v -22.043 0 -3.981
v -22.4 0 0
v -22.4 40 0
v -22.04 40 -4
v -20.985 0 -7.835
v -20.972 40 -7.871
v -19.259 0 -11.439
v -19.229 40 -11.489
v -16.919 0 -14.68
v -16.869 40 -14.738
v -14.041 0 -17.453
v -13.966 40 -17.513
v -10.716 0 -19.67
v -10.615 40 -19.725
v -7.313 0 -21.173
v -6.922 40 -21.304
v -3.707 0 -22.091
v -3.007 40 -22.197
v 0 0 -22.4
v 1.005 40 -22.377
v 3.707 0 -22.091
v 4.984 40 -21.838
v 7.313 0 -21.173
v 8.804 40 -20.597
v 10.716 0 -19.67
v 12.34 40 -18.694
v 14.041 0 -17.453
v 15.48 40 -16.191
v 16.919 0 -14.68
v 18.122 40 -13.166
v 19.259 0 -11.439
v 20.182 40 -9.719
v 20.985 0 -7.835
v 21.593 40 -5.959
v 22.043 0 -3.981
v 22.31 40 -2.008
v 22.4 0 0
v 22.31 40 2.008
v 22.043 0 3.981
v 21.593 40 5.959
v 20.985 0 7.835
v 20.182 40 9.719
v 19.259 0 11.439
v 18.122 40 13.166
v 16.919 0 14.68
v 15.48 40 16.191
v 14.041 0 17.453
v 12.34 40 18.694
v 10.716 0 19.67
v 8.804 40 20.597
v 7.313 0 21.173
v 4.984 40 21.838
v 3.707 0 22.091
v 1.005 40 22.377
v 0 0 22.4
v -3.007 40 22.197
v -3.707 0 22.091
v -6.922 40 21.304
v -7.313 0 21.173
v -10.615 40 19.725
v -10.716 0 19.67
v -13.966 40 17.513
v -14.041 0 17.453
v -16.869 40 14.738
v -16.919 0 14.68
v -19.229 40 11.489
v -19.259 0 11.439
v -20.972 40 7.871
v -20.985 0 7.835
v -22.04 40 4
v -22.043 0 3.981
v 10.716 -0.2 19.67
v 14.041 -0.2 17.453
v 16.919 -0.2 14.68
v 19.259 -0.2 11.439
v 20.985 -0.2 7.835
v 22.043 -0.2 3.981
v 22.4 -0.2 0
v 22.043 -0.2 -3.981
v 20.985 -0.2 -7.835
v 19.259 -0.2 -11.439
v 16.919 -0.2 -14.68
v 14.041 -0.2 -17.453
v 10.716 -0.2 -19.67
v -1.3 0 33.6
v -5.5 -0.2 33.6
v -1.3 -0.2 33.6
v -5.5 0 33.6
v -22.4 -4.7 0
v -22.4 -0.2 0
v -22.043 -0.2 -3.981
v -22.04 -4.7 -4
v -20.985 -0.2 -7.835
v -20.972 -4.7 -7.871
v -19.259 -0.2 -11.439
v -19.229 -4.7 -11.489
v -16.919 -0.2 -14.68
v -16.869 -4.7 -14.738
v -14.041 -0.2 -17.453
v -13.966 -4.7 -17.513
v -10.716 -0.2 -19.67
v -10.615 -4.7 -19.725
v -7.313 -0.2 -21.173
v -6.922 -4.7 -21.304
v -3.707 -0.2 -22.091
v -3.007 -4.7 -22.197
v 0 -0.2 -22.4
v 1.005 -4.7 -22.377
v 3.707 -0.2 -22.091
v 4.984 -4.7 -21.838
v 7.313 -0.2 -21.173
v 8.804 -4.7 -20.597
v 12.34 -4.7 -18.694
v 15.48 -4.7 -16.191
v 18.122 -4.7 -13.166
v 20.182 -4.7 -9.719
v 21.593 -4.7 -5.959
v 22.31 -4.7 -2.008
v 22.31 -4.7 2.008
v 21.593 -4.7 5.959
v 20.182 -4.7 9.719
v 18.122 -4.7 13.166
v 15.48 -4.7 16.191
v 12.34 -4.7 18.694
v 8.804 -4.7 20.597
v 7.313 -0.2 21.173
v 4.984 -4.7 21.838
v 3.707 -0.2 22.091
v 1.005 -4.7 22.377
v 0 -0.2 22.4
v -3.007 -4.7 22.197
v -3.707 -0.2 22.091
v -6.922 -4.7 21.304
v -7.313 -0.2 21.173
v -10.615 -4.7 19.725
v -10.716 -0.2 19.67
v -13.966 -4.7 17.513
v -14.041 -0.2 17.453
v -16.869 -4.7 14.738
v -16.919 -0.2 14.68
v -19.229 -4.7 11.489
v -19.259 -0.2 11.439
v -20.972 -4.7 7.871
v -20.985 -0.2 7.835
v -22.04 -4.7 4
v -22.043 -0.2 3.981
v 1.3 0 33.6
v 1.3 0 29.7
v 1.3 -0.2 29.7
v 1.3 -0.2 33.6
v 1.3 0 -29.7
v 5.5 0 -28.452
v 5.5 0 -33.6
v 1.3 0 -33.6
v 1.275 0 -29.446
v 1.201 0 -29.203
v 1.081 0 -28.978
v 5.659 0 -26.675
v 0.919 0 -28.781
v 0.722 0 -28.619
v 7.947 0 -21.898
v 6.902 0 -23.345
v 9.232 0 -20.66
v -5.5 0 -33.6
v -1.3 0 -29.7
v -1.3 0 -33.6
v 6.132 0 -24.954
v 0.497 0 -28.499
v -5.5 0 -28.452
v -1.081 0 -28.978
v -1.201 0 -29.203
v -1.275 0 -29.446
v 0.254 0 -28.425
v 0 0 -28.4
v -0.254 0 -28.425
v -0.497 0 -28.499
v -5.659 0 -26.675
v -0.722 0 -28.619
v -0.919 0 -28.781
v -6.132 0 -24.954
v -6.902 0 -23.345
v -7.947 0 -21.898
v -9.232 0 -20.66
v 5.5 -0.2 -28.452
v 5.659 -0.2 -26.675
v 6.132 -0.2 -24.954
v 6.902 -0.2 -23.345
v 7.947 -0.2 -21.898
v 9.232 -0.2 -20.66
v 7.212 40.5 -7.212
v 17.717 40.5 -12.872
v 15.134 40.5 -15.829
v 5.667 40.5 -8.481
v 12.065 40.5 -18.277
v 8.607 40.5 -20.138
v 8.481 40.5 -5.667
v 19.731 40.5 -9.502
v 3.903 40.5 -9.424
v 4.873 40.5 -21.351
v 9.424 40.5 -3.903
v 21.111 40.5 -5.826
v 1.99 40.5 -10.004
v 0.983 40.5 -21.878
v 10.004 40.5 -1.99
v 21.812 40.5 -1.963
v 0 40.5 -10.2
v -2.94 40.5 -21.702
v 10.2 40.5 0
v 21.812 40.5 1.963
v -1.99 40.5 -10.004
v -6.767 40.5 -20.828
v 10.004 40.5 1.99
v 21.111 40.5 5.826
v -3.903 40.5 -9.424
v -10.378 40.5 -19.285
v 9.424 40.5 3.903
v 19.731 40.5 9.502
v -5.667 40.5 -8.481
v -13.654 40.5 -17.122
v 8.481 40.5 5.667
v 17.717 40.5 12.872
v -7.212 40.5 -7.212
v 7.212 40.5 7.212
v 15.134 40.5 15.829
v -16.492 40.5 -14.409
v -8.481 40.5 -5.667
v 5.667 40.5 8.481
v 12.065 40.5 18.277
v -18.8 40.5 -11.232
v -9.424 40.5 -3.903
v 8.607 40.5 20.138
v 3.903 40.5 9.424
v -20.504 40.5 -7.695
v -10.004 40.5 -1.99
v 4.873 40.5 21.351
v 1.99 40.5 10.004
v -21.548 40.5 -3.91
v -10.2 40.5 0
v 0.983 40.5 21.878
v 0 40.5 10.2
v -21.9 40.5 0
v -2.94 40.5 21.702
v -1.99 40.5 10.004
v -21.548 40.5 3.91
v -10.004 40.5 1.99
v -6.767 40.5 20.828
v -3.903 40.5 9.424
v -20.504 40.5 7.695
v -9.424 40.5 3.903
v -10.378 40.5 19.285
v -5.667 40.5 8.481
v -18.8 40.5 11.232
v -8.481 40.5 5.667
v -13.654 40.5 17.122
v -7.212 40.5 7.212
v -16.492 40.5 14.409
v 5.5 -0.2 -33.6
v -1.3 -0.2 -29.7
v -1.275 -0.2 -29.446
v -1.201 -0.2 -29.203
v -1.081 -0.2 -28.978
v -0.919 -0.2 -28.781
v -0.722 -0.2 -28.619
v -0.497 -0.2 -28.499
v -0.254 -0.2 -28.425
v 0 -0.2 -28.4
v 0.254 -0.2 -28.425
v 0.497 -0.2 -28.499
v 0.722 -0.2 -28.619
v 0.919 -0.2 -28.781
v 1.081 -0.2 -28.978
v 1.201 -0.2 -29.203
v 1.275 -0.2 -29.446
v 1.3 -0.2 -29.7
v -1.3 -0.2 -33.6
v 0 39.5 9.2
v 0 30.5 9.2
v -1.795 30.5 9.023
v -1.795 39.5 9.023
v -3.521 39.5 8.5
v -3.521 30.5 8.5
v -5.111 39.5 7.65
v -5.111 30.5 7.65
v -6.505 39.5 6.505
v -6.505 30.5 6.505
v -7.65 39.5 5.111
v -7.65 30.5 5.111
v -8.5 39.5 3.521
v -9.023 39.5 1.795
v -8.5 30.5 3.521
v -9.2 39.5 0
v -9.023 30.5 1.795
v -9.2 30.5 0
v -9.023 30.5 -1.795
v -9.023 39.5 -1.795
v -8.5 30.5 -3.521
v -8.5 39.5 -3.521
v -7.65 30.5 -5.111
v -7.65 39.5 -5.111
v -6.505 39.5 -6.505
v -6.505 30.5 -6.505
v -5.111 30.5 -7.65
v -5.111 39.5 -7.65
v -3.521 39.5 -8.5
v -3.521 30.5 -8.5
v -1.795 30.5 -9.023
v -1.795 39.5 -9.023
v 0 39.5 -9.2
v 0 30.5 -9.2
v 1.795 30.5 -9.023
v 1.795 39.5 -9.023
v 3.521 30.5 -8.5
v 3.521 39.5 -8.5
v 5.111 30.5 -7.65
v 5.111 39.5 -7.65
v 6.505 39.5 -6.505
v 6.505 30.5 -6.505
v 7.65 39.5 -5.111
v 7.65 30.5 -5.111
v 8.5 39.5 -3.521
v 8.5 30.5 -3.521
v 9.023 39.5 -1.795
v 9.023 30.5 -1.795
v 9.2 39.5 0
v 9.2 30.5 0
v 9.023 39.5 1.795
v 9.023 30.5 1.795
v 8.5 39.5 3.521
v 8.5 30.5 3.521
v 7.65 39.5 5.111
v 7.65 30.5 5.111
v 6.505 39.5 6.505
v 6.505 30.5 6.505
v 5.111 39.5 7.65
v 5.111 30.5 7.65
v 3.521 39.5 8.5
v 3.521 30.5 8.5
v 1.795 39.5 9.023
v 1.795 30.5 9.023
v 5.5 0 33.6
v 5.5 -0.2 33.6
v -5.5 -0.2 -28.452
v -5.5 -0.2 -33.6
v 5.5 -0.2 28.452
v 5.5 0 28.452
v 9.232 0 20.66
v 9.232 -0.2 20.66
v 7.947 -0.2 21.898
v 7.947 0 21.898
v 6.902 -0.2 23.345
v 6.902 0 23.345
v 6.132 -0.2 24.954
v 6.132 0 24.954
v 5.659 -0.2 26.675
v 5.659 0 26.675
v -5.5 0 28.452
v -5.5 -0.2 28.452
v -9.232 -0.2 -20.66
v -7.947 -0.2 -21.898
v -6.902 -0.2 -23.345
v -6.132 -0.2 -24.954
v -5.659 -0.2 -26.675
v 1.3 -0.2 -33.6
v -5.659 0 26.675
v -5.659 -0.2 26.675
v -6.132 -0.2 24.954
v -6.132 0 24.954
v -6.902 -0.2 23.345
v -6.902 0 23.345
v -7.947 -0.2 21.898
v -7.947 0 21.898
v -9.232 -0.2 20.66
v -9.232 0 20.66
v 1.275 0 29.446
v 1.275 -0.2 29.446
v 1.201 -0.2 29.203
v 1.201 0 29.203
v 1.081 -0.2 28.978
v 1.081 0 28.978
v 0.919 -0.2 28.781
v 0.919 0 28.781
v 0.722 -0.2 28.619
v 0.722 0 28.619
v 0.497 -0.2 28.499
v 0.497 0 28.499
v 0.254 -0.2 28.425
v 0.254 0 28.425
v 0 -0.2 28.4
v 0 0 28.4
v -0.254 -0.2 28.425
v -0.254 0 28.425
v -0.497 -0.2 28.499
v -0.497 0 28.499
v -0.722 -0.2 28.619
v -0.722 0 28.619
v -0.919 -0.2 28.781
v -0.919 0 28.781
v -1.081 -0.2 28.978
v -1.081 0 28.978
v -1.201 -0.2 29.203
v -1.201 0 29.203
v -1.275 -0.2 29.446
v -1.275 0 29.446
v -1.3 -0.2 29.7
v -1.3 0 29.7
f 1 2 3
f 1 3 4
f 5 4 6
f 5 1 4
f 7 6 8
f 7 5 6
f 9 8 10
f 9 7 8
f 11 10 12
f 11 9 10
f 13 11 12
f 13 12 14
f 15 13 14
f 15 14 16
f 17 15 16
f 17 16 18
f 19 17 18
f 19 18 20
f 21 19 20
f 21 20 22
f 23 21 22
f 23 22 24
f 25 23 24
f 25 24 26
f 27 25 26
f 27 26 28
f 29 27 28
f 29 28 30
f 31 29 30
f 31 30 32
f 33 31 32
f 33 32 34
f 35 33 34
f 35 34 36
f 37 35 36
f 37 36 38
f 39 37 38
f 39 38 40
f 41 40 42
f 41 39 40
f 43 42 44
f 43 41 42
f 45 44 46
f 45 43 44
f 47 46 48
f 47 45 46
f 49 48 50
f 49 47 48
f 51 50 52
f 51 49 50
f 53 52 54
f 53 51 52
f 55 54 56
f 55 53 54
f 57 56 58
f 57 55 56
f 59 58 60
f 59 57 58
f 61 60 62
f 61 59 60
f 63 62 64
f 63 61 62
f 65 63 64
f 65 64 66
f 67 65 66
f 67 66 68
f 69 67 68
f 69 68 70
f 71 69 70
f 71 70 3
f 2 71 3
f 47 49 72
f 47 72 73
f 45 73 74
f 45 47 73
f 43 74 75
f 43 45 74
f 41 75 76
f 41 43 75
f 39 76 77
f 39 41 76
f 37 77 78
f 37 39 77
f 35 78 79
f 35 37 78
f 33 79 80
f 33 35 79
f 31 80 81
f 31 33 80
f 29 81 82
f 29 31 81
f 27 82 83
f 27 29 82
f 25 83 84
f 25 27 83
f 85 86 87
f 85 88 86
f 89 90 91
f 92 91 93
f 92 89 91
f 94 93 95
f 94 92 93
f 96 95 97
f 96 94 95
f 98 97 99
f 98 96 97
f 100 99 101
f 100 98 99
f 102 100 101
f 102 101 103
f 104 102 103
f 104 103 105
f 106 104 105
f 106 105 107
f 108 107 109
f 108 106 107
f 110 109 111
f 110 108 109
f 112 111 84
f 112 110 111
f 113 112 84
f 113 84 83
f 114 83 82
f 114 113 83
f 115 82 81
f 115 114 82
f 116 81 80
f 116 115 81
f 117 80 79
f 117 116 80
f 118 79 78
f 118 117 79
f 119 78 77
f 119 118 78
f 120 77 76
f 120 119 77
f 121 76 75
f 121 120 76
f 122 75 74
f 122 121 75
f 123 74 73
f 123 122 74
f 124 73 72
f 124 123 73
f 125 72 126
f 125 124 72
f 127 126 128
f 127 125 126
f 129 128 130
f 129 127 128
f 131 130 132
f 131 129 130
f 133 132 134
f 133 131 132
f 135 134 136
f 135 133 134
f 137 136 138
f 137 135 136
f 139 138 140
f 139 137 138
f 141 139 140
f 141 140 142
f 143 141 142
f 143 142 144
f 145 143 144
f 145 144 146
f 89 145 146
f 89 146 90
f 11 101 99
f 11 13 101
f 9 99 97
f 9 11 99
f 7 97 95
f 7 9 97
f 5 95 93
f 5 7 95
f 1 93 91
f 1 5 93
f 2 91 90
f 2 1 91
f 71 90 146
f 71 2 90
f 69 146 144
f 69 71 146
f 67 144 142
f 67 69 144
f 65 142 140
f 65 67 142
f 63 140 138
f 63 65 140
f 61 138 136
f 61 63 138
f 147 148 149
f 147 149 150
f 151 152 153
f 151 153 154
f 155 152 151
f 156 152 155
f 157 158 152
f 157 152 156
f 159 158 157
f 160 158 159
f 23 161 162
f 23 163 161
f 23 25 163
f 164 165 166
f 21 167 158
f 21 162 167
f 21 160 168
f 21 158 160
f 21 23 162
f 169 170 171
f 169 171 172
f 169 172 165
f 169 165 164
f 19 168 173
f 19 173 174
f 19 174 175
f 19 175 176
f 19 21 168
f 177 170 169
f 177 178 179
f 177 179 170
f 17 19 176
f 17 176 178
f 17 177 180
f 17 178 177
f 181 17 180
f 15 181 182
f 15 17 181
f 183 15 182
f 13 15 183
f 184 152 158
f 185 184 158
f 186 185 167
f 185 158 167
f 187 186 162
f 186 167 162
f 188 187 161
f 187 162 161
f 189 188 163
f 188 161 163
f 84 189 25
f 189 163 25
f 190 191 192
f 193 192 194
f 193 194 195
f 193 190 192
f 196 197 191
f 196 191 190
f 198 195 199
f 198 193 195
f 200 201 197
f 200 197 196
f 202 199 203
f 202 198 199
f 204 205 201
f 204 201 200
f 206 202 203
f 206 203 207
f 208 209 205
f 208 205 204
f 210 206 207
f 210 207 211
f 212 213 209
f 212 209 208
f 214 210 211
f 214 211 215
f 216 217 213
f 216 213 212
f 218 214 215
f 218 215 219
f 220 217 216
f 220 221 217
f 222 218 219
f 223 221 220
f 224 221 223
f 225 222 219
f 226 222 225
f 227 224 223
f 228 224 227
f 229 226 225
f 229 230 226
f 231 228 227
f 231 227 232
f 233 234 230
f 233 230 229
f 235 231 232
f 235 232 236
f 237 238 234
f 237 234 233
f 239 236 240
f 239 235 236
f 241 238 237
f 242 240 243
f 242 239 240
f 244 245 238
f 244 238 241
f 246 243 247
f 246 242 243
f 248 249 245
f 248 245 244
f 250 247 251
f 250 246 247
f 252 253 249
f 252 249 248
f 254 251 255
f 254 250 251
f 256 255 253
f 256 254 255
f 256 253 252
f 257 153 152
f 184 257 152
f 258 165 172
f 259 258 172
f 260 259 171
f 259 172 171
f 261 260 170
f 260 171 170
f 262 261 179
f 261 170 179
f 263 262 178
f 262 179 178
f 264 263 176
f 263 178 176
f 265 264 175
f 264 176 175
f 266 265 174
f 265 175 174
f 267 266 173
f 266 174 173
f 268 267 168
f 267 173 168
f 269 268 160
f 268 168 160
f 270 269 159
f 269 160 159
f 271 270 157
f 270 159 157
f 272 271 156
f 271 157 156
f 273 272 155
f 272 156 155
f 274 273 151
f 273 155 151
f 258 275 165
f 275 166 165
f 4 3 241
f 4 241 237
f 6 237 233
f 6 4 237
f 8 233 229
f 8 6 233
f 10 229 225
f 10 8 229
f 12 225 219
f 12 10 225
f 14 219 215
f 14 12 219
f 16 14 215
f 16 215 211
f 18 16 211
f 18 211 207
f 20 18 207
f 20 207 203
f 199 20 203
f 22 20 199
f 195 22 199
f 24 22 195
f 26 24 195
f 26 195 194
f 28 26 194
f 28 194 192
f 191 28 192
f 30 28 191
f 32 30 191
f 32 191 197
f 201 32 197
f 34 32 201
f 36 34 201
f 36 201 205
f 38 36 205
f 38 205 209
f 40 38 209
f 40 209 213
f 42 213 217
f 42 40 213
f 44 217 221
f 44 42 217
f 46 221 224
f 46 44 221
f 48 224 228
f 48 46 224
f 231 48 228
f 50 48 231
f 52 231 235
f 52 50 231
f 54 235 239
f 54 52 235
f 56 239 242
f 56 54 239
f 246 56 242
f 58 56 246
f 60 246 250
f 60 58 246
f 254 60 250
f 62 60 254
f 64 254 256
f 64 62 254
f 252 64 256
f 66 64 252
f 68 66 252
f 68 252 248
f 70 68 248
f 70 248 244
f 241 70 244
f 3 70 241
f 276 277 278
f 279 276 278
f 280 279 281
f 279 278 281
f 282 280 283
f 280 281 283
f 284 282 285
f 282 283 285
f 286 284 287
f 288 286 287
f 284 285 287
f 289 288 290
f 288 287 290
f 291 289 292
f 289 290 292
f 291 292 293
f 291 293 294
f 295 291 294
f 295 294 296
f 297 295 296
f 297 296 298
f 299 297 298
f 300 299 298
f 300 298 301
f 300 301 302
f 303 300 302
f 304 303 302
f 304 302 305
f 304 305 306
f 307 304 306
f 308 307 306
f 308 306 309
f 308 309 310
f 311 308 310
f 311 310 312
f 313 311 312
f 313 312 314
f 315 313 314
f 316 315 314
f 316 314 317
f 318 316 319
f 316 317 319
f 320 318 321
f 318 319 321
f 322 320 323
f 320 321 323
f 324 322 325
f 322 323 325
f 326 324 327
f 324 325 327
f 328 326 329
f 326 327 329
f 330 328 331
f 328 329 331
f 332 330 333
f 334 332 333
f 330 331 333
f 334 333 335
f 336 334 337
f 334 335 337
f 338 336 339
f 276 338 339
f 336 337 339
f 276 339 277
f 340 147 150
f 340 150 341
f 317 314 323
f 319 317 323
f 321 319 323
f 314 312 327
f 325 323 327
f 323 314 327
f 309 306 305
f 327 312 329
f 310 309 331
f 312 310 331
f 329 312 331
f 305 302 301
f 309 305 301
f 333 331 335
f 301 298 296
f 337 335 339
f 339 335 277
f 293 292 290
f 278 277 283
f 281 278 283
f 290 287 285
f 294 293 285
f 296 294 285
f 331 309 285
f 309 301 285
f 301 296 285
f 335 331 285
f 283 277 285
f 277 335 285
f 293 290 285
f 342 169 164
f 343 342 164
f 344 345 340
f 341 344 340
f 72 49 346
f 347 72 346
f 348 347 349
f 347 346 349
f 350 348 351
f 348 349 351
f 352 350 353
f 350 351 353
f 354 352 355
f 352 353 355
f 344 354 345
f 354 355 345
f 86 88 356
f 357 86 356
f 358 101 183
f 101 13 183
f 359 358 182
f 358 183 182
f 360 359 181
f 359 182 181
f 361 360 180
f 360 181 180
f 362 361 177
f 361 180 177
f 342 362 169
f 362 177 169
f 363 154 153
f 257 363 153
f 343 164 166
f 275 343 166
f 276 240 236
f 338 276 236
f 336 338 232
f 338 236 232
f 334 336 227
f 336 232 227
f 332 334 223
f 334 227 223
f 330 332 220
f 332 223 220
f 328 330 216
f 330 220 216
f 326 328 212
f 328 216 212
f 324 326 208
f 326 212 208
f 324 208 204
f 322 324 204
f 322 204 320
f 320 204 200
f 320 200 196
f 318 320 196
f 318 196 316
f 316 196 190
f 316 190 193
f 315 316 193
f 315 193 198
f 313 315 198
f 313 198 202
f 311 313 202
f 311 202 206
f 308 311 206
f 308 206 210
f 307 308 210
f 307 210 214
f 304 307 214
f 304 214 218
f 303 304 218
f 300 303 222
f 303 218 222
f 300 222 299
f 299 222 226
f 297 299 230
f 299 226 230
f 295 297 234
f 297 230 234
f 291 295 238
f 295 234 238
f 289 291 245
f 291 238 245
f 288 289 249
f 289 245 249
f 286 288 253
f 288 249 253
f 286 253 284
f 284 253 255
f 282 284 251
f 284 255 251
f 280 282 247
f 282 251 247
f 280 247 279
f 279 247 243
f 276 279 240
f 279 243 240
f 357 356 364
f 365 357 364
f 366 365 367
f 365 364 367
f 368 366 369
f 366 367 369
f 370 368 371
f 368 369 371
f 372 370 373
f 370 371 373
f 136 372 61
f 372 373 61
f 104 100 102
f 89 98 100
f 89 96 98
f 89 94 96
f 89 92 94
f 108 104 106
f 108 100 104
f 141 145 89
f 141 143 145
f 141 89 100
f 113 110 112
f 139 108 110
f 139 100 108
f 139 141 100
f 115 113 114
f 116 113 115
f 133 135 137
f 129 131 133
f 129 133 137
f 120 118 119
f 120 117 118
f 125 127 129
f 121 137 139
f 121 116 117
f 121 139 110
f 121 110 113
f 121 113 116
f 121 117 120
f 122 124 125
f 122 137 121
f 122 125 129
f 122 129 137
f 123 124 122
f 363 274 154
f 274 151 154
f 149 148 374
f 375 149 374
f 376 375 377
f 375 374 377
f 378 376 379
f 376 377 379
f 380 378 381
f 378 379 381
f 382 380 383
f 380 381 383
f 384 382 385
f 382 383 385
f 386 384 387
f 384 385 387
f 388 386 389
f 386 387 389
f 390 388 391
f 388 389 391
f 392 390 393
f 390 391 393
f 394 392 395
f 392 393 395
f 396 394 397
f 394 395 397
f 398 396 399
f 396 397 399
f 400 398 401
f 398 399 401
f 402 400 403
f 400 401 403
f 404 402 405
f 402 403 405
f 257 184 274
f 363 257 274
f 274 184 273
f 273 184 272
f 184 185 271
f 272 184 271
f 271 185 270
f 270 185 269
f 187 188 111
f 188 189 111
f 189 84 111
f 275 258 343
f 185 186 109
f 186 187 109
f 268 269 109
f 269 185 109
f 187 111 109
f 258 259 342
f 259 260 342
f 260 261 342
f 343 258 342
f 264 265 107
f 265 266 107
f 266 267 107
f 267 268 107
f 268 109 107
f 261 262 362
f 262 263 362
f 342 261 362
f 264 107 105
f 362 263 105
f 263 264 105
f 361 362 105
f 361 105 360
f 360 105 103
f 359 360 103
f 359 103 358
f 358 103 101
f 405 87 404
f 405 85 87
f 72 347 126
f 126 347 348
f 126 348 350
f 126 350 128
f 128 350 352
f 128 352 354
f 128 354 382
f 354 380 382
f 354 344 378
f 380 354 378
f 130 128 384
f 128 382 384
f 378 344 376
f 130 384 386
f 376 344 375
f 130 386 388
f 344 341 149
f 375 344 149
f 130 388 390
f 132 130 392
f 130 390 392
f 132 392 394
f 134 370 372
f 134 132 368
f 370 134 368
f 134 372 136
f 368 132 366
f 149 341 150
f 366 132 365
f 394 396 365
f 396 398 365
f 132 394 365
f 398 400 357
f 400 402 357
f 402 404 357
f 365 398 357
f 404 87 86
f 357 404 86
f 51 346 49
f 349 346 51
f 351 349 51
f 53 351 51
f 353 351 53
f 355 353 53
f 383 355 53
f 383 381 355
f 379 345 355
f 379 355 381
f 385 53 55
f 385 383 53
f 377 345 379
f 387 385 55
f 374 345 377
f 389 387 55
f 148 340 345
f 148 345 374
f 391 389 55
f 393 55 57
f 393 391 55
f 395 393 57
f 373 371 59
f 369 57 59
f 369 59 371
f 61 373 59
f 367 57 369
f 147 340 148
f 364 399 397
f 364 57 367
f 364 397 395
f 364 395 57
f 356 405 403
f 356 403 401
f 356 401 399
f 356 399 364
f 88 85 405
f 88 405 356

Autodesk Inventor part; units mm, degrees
sketch "Sketch1" plane through (0, 0, 0) normal (0, 1, 0) x (-1, 0, 0)
  circle A0 centre (0, 0) radius 22.4
  dimension "d0" = 44.8
ref_plane "Work Plane1" through (0, 40.5, 0) normal (0, 1, 0) x (-1, 0, 0)
sketch "Sketch2" plane through (0, 40.5, 0) normal (0, 1, 0) x (-1, 0, 0)
  circle A0 centre (0, 0) radius 22.4 projected
ref_plane "Work Plane3" through (0, -53, 0) normal (0, 1, 0) x (-1, 0, 0)
ref_plane "Work Plane2" through (0, -41, 0) normal (0, 1, 0) x (-1, 0, 0)
sketch "Sketch3" plane through (0, -41, 0) normal (0, 1, 0) x (-1, 0, 0)
  circle A0 centre (0, 0) radius 33.8
  dimension "d4" = 67.6
sketch "Sketch4" plane through (0, -53, 0) normal (0, 1, 0) x (-1, 0, 0)
  circle A0 centre (0, 0) radius 33.8 projected
loft "Loft1" add profiles "Sketch2", "Sketch1"
loft "Loft3" [suppressed]
sketch "Sketch5" plane through (0, 0, 0) normal (0, 1, 0) x (-1, 0, 0)
  line L0 (-5.5, 33.6) -> (5.5, -33.6) construction
  line L1 (3.6185, 22.1058) -> (-5.5, -33.6) construction
  line L2 (5.5, 33.6) -> (5.5, 28.4519)
  line L3 (5.5, -28.4519) -> (5.5, -33.6)
  line L4 (-5.5, -33.6) -> (-5.5, -28.4519)
  line L5 (-5.5, 28.4519) -> (-5.5, 33.6)
  arc A0 (-10.716, 19.6704) -> (-10.716, -19.6704) centre (0, 0) ccw
  arc A1 (10.716, -19.6704) -> (10.716, 19.6704) centre (0, 0) ccw
  arc A2 (5.5, 28.4519) -> (10.716, 19.6704) centre (15.5, 28.4519) ccw
  arc A3 (-10.716, 19.6704) -> (-5.5, 28.4519) centre (-15.5, 28.4519) ccw
  arc A4 (10.716, -19.6704) -> (5.5, -28.4519) centre (15.5, -28.4519) ccw
  arc A5 (-5.5, -28.4519) -> (-10.716, -19.6704) centre (-15.5, -28.4519) ccw
  circle A6 centre (0, 0) radius 22.4 construction
  line L6 (0, -22.4) -> (0, -33.6) construction
  line L7 (1.3, -33.6) -> (1.3, -29.7)
  line L8 (0, -28.4) -> (0, -28.4)
  line L9 (-1.3, -29.7) -> (-1.3, -33.6)
  arc A7 (1.3, -29.7) -> (0, -28.4) centre (0, -29.7) ccw
  arc A8 (0, -28.4) -> (-1.3, -29.7) centre (0, -29.7) ccw
  line L10 (5.5, -33.6) -> (1.3, -33.6)
  line L11 (-1.3, -33.6) -> (-5.5, -33.6)
  circle A9 centre (0, 0) radius 33.8 construction
  line L12 (33.8, 0) -> (-33.8, 0) construction
  line L13 (0, 22.4) -> (0, 33.6) construction
  line L14 (1.3, 33.6) -> (1.3, 29.7)
  line L15 (-1.3, 29.7) -> (-1.3, 33.6)
  arc A10 (0, 28.4) -> (1.3, 29.7) centre (0, 29.7) ccw
  arc A11 (-1.3, 29.7) -> (0, 28.4) centre (0, 29.7) ccw
  line L16 (5.5, 33.6) -> (1.3, 33.6)
  line L17 (-1.3, 33.6) -> (-5.5, 33.6)
  circle A12 centre (0, 0) radius 33.8 construction
  point P0 (5.5, 21.7143)
  point P1 (5.5, -21.7143)
  point P2 (-5.5, 21.7143)
  point P3 (-5.5, -21.7143)
  point P4 (1.3, -28.4)
  point P5 (-1.3, -28.4)
  point P6 (1.3, 28.4)
  point P7 (-1.3, 28.4)
  point P8 (0, 28.4)
  dimension "d17" = 11
  dimension "d18" = 67.2
  dimension "d19" = 10
  dimension "d20" = 2.6
  dimension "d21" = 5.2
  dimension "d22" = 1.3
extrude "Extrusion1" add sketch "Sketch5" against normal blind 0.2
ref_plane "Work Plane4" through (0, -4.7, 0) normal (0, 1, 0) x (-1, 0, 0)
sketch "Sketch6" plane through (0, -4.7, 0) normal (0, 1, 0) x (-1, 0, 0)
  circle A0 centre (0, 0) radius 22.4 projected
ref_plane "Work Plane5" through (0, -53, 0) normal (0, 1, 0) x (-1, 0, 0)
sketch "Sketch7" plane through (0, -53, 0) normal (0, 1, 0) x (-1, 0, 0)
  circle A0 centre (0, 0) radius 33.8 projected
loft "Loft4" add profiles "Sketch7", "Sketch3"
loft "Loft5" add profiles "Sketch6" section 1 edges at (33.8, -41, 0)
sketch "Sketch8" plane through (0, 0, 0) normal (0, 1, 0) x (-1, 0, 0)
  circle A0 centre (0, 0) radius 22.4 projected
loft "Loft6" add profiles "Sketch8" section 2 edges at (22.4, -4.7, 0)
sketch "Sketch9" plane through (0, 40.5, 0) normal (0, 1, 0) x (1, 0, 0)
  point P0 (0, 0)
  point P1 (0, 0)
hole "Hole1" at (0, 40.5, 0) direction (0, -1, 0) diameter 18.4 depth 10
chamfer "Chamfer1" distance 1 angle 45 1 edges at (0, 40.5, -9.2)
chamfer "Chamfer2" distance 0.5 angle 45 1 edges at (22.4, 40.5, 0)
sketch "Sketch10" plane through (0, -53, 0) normal (0, -1, 0) x (1, 0, 0)
  point P0 (0, 0)
  point P1 (0, 0)
hole "Hole2" at (0, -53, 0) direction (0, 1, 0) diameter 13.5 depth 10
sketch "Sketch11" plane through (0, -53, 0) normal (0, -1, 0) x (1, 0, 0)
  line L0 (56, 85) -> (-56, 85)
  line L1 (-56, 85) -> (-56, -85)
  line L2 (-56, -85) -> (56, -85)
  line L3 (56, -85) -> (56, 85)
  line L4 (56, 85) -> (-56, -85) construction
  line L5 (-56, 85) -> (56, -85) construction
  point P0 (0, 0)
extrude "Extrusion2" cut sketch "Sketch11" against normal blind 48.3
properties part number "shaker cut"
